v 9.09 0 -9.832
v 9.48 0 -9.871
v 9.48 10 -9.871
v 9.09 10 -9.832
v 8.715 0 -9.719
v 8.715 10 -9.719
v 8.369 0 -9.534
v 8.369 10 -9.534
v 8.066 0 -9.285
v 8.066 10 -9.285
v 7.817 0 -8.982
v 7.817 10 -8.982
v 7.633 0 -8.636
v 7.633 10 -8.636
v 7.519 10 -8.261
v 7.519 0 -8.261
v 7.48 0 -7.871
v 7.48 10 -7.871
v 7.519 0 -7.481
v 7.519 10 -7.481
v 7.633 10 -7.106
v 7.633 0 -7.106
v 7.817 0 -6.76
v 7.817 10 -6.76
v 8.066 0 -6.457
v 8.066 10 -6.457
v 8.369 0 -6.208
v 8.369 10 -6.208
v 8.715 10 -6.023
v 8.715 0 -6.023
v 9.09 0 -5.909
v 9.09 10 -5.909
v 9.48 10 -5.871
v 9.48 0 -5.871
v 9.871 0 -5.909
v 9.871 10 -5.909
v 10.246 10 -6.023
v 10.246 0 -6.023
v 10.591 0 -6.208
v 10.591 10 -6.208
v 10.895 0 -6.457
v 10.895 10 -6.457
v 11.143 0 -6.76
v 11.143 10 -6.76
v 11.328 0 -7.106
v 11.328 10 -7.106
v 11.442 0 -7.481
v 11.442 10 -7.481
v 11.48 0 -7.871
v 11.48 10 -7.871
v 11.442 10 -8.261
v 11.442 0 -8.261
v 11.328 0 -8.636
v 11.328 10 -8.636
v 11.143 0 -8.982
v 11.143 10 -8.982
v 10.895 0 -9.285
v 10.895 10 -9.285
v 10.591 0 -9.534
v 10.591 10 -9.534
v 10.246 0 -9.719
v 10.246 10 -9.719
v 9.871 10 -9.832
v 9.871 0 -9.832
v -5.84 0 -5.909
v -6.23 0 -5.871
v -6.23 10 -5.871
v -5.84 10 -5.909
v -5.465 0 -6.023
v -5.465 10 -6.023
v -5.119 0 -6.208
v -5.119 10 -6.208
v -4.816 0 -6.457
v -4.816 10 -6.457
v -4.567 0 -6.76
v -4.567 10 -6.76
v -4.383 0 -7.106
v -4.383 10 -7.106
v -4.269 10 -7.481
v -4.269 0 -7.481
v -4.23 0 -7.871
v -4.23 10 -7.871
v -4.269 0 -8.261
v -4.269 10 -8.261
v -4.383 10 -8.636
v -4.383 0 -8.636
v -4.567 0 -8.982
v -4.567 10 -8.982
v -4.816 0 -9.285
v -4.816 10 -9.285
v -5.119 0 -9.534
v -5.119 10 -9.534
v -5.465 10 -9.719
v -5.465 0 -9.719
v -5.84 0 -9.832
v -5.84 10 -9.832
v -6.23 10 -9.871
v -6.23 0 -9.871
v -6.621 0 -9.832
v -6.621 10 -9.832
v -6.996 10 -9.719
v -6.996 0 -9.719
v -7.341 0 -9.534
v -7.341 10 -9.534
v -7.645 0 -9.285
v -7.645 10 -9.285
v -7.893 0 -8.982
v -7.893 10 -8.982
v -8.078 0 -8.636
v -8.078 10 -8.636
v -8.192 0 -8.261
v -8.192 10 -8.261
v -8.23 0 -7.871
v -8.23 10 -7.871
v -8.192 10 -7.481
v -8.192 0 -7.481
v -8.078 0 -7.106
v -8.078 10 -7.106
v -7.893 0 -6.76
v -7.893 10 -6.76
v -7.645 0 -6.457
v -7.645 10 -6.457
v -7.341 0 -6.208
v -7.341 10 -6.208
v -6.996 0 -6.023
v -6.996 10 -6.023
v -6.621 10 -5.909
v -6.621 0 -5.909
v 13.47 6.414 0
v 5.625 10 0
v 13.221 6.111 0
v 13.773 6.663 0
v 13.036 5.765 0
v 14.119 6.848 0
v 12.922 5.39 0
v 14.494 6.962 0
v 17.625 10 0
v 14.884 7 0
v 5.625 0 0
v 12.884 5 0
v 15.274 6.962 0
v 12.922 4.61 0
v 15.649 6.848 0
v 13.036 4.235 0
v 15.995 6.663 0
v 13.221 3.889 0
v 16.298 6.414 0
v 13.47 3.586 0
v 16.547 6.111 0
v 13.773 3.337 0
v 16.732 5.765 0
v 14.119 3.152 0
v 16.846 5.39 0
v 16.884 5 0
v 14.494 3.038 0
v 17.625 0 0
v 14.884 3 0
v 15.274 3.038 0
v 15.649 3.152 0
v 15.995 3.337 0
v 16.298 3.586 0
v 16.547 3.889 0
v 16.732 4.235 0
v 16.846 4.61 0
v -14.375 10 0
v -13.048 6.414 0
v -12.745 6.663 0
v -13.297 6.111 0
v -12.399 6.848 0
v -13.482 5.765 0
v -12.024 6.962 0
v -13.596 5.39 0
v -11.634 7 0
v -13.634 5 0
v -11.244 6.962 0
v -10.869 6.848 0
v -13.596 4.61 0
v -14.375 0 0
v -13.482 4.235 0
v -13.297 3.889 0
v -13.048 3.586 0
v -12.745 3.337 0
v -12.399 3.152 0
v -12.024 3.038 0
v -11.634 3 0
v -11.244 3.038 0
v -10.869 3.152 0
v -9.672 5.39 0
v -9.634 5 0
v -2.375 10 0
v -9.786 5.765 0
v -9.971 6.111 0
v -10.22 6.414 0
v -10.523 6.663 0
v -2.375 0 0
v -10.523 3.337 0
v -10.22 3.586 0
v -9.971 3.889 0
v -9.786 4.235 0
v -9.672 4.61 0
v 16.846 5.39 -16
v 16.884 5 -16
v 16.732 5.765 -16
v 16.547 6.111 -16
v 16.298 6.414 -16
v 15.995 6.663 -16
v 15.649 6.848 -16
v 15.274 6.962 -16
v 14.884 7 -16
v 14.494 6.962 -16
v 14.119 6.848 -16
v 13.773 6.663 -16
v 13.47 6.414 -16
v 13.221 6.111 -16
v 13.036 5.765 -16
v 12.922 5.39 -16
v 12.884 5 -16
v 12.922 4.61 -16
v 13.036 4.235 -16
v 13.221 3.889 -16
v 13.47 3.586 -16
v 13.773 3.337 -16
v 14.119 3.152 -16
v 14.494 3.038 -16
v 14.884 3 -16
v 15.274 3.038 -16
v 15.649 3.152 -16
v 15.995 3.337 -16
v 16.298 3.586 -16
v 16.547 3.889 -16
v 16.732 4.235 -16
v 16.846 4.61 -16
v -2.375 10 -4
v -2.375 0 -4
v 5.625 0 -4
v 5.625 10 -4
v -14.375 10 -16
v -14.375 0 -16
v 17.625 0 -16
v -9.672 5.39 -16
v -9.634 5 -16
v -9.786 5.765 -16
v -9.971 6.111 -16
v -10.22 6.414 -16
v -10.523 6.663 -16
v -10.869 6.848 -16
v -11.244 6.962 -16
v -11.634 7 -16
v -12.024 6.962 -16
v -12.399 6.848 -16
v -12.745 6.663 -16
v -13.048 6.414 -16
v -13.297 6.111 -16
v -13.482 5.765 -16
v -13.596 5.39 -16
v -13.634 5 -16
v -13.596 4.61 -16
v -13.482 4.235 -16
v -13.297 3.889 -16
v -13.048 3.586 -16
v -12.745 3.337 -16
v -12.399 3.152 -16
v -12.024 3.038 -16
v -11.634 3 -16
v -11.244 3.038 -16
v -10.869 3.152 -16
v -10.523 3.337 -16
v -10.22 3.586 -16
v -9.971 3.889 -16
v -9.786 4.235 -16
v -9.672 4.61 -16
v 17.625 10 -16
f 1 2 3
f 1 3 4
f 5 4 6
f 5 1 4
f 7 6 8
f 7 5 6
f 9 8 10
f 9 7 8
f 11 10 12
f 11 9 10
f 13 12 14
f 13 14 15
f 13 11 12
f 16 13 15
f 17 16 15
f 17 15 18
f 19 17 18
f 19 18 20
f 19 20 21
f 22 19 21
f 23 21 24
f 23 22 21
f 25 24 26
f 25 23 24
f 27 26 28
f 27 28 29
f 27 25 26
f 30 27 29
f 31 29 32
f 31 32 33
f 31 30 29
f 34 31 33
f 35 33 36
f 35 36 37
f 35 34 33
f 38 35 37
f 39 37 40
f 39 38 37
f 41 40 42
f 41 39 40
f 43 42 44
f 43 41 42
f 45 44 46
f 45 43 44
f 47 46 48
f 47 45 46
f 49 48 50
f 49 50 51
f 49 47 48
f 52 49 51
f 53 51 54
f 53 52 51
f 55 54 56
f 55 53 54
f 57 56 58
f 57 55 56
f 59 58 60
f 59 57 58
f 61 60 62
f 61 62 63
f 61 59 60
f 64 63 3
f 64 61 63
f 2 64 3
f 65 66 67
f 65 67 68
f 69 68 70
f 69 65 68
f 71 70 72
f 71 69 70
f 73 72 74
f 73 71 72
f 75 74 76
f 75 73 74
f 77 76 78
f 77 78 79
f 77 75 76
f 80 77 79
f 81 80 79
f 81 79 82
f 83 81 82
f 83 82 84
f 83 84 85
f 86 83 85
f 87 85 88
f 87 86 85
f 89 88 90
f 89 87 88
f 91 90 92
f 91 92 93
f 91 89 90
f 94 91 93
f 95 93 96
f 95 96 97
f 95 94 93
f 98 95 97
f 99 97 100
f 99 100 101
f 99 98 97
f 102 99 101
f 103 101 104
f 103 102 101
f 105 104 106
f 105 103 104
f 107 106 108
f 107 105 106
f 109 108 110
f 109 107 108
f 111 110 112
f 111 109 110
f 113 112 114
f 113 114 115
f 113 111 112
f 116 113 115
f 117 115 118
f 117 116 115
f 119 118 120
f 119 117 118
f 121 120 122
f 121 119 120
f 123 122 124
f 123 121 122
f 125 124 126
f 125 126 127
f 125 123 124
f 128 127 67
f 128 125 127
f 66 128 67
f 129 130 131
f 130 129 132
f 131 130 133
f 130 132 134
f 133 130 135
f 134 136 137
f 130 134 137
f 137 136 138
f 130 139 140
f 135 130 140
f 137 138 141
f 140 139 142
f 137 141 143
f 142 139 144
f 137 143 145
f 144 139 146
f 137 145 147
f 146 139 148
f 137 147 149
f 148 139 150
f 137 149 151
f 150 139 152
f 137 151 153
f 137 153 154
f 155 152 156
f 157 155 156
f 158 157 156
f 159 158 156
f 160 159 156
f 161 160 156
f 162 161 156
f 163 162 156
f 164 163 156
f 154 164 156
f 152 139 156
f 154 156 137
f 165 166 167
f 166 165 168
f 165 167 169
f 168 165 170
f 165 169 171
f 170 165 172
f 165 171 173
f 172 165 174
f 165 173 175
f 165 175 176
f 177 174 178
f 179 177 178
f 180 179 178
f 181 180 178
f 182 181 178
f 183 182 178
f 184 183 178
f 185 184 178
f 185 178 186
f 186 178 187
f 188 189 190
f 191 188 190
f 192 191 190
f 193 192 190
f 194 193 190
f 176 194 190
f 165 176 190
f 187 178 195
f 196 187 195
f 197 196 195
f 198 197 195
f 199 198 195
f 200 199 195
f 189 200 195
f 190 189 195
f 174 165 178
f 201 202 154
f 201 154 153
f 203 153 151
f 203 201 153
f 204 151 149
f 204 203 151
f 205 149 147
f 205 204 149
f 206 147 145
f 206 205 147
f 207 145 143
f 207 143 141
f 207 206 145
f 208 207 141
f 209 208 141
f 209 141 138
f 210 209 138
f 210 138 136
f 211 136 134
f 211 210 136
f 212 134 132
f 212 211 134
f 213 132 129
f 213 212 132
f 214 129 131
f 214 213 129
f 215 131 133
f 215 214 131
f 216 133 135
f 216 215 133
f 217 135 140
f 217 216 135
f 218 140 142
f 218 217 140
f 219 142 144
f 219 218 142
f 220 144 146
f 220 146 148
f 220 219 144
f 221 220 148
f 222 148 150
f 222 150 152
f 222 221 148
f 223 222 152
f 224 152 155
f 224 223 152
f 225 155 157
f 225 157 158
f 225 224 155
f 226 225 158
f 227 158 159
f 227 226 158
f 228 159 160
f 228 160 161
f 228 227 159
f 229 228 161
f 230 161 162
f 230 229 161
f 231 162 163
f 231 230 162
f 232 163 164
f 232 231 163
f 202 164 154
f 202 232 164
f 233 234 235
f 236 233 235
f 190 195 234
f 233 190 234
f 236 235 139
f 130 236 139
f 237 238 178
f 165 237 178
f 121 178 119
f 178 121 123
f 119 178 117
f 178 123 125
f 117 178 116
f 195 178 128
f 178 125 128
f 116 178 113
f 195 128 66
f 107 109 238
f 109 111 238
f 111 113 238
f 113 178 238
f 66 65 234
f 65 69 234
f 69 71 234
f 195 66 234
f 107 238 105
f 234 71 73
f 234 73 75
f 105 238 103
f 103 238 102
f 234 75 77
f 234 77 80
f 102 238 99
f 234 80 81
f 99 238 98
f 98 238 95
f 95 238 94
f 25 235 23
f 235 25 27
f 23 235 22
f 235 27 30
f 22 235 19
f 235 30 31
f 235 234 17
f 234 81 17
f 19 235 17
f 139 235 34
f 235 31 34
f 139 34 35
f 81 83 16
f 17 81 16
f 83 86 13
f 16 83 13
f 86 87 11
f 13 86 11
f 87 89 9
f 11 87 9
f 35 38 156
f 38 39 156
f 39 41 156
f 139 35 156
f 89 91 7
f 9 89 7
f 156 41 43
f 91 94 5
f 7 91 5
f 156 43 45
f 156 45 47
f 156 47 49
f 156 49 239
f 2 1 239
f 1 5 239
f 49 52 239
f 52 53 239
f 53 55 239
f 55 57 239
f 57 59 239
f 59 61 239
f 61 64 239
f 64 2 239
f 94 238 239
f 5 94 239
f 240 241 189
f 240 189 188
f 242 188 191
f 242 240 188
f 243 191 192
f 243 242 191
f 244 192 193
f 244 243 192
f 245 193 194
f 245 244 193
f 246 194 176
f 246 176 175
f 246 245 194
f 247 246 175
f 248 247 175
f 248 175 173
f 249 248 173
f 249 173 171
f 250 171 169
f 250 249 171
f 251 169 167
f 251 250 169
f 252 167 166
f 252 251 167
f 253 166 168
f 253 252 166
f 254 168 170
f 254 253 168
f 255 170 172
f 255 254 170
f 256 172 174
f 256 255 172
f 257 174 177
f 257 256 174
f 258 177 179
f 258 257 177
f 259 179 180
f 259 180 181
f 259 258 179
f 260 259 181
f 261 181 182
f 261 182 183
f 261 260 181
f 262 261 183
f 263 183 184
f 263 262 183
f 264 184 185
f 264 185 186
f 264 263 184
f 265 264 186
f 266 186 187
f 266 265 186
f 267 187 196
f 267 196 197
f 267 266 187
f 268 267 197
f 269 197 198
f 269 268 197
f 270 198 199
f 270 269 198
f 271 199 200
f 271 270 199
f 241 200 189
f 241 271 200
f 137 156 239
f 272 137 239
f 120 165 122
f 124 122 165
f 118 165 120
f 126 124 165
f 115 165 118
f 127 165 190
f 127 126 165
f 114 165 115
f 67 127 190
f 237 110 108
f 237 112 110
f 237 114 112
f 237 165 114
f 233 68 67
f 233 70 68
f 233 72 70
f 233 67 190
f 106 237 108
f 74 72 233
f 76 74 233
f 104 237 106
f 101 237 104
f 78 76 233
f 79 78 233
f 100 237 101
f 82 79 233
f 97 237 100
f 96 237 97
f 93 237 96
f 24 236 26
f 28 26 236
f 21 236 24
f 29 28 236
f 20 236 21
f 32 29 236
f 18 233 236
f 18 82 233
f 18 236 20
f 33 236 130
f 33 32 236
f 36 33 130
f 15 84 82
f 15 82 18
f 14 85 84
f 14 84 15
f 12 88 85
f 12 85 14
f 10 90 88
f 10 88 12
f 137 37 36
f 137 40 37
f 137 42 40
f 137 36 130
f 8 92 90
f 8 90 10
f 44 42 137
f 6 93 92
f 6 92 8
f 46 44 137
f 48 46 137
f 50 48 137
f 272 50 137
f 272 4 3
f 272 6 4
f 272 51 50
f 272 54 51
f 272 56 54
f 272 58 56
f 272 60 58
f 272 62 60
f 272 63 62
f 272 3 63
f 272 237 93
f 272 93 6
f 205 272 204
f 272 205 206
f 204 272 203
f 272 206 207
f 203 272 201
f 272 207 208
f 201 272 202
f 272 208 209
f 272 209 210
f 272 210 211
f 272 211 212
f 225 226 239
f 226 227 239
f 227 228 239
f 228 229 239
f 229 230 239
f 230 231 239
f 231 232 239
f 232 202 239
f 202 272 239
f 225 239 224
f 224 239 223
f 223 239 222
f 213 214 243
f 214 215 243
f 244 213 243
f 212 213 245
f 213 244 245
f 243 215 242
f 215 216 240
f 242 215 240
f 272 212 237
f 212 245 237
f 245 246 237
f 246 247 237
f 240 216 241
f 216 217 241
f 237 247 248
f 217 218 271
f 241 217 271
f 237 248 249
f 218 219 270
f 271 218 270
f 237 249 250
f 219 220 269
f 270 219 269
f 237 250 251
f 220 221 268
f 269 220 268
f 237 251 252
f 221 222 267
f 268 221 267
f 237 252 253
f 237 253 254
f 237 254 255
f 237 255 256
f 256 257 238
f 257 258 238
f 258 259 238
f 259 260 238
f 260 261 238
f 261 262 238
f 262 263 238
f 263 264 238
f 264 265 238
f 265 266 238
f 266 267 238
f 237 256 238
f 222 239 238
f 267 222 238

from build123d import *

# Parameters (mm, degrees)
SKETCH_1_R              = 2
EXTRUDE_1_DEPTH         = 10
CUT_EXTRUDE_START       = -16
CUT_EXTRUDE_1_OUTLINE_R = 2
CUT_EXTRUDE_1_DEPTH     = 16


# Read off the part's stored shape, not the designer's step: 切除-拉伸1
with BuildPart() as part:
    # 草图1 → 凸台-拉伸1 (new body)
    with BuildSketch(Plane(origin=(0, 0, 0), x_dir=(1, 0, 0), z_dir=(0, 1, 0))):
        Polygon((-14.375, 0), (-2.375, 0), (-2.375, 4), (5.625, 4), (5.625, 0), (17.625, 0), (17.625, 16), (-14.375, 16), align=None)
        with Locations(Location((-6.230357992, 7.870924175, 0), (0, 0, 270))):
            Circle(SKETCH_1_R, mode=Mode.SUBTRACT)
        with Locations(Location((9.480357992, 7.870924175, 0), (0, 0, 90))):
            Circle(SKETCH_1_R, mode=Mode.SUBTRACT)
    extrude(amount=EXTRUDE_1_DEPTH)

    # 切除-拉伸1 outline → 切除-拉伸1 (cut)
    with BuildSketch(Plane.XY.offset(CUT_EXTRUDE_START)):
        with Locations((14.884036252, 5)):
            Circle(CUT_EXTRUDE_1_OUTLINE_R)
        with Locations((-11.634036252, 5)):
            Circle(CUT_EXTRUDE_1_OUTLINE_R)
    extrude(amount=CUT_EXTRUDE_1_DEPTH, mode=Mode.SUBTRACT)


solid = part.part
